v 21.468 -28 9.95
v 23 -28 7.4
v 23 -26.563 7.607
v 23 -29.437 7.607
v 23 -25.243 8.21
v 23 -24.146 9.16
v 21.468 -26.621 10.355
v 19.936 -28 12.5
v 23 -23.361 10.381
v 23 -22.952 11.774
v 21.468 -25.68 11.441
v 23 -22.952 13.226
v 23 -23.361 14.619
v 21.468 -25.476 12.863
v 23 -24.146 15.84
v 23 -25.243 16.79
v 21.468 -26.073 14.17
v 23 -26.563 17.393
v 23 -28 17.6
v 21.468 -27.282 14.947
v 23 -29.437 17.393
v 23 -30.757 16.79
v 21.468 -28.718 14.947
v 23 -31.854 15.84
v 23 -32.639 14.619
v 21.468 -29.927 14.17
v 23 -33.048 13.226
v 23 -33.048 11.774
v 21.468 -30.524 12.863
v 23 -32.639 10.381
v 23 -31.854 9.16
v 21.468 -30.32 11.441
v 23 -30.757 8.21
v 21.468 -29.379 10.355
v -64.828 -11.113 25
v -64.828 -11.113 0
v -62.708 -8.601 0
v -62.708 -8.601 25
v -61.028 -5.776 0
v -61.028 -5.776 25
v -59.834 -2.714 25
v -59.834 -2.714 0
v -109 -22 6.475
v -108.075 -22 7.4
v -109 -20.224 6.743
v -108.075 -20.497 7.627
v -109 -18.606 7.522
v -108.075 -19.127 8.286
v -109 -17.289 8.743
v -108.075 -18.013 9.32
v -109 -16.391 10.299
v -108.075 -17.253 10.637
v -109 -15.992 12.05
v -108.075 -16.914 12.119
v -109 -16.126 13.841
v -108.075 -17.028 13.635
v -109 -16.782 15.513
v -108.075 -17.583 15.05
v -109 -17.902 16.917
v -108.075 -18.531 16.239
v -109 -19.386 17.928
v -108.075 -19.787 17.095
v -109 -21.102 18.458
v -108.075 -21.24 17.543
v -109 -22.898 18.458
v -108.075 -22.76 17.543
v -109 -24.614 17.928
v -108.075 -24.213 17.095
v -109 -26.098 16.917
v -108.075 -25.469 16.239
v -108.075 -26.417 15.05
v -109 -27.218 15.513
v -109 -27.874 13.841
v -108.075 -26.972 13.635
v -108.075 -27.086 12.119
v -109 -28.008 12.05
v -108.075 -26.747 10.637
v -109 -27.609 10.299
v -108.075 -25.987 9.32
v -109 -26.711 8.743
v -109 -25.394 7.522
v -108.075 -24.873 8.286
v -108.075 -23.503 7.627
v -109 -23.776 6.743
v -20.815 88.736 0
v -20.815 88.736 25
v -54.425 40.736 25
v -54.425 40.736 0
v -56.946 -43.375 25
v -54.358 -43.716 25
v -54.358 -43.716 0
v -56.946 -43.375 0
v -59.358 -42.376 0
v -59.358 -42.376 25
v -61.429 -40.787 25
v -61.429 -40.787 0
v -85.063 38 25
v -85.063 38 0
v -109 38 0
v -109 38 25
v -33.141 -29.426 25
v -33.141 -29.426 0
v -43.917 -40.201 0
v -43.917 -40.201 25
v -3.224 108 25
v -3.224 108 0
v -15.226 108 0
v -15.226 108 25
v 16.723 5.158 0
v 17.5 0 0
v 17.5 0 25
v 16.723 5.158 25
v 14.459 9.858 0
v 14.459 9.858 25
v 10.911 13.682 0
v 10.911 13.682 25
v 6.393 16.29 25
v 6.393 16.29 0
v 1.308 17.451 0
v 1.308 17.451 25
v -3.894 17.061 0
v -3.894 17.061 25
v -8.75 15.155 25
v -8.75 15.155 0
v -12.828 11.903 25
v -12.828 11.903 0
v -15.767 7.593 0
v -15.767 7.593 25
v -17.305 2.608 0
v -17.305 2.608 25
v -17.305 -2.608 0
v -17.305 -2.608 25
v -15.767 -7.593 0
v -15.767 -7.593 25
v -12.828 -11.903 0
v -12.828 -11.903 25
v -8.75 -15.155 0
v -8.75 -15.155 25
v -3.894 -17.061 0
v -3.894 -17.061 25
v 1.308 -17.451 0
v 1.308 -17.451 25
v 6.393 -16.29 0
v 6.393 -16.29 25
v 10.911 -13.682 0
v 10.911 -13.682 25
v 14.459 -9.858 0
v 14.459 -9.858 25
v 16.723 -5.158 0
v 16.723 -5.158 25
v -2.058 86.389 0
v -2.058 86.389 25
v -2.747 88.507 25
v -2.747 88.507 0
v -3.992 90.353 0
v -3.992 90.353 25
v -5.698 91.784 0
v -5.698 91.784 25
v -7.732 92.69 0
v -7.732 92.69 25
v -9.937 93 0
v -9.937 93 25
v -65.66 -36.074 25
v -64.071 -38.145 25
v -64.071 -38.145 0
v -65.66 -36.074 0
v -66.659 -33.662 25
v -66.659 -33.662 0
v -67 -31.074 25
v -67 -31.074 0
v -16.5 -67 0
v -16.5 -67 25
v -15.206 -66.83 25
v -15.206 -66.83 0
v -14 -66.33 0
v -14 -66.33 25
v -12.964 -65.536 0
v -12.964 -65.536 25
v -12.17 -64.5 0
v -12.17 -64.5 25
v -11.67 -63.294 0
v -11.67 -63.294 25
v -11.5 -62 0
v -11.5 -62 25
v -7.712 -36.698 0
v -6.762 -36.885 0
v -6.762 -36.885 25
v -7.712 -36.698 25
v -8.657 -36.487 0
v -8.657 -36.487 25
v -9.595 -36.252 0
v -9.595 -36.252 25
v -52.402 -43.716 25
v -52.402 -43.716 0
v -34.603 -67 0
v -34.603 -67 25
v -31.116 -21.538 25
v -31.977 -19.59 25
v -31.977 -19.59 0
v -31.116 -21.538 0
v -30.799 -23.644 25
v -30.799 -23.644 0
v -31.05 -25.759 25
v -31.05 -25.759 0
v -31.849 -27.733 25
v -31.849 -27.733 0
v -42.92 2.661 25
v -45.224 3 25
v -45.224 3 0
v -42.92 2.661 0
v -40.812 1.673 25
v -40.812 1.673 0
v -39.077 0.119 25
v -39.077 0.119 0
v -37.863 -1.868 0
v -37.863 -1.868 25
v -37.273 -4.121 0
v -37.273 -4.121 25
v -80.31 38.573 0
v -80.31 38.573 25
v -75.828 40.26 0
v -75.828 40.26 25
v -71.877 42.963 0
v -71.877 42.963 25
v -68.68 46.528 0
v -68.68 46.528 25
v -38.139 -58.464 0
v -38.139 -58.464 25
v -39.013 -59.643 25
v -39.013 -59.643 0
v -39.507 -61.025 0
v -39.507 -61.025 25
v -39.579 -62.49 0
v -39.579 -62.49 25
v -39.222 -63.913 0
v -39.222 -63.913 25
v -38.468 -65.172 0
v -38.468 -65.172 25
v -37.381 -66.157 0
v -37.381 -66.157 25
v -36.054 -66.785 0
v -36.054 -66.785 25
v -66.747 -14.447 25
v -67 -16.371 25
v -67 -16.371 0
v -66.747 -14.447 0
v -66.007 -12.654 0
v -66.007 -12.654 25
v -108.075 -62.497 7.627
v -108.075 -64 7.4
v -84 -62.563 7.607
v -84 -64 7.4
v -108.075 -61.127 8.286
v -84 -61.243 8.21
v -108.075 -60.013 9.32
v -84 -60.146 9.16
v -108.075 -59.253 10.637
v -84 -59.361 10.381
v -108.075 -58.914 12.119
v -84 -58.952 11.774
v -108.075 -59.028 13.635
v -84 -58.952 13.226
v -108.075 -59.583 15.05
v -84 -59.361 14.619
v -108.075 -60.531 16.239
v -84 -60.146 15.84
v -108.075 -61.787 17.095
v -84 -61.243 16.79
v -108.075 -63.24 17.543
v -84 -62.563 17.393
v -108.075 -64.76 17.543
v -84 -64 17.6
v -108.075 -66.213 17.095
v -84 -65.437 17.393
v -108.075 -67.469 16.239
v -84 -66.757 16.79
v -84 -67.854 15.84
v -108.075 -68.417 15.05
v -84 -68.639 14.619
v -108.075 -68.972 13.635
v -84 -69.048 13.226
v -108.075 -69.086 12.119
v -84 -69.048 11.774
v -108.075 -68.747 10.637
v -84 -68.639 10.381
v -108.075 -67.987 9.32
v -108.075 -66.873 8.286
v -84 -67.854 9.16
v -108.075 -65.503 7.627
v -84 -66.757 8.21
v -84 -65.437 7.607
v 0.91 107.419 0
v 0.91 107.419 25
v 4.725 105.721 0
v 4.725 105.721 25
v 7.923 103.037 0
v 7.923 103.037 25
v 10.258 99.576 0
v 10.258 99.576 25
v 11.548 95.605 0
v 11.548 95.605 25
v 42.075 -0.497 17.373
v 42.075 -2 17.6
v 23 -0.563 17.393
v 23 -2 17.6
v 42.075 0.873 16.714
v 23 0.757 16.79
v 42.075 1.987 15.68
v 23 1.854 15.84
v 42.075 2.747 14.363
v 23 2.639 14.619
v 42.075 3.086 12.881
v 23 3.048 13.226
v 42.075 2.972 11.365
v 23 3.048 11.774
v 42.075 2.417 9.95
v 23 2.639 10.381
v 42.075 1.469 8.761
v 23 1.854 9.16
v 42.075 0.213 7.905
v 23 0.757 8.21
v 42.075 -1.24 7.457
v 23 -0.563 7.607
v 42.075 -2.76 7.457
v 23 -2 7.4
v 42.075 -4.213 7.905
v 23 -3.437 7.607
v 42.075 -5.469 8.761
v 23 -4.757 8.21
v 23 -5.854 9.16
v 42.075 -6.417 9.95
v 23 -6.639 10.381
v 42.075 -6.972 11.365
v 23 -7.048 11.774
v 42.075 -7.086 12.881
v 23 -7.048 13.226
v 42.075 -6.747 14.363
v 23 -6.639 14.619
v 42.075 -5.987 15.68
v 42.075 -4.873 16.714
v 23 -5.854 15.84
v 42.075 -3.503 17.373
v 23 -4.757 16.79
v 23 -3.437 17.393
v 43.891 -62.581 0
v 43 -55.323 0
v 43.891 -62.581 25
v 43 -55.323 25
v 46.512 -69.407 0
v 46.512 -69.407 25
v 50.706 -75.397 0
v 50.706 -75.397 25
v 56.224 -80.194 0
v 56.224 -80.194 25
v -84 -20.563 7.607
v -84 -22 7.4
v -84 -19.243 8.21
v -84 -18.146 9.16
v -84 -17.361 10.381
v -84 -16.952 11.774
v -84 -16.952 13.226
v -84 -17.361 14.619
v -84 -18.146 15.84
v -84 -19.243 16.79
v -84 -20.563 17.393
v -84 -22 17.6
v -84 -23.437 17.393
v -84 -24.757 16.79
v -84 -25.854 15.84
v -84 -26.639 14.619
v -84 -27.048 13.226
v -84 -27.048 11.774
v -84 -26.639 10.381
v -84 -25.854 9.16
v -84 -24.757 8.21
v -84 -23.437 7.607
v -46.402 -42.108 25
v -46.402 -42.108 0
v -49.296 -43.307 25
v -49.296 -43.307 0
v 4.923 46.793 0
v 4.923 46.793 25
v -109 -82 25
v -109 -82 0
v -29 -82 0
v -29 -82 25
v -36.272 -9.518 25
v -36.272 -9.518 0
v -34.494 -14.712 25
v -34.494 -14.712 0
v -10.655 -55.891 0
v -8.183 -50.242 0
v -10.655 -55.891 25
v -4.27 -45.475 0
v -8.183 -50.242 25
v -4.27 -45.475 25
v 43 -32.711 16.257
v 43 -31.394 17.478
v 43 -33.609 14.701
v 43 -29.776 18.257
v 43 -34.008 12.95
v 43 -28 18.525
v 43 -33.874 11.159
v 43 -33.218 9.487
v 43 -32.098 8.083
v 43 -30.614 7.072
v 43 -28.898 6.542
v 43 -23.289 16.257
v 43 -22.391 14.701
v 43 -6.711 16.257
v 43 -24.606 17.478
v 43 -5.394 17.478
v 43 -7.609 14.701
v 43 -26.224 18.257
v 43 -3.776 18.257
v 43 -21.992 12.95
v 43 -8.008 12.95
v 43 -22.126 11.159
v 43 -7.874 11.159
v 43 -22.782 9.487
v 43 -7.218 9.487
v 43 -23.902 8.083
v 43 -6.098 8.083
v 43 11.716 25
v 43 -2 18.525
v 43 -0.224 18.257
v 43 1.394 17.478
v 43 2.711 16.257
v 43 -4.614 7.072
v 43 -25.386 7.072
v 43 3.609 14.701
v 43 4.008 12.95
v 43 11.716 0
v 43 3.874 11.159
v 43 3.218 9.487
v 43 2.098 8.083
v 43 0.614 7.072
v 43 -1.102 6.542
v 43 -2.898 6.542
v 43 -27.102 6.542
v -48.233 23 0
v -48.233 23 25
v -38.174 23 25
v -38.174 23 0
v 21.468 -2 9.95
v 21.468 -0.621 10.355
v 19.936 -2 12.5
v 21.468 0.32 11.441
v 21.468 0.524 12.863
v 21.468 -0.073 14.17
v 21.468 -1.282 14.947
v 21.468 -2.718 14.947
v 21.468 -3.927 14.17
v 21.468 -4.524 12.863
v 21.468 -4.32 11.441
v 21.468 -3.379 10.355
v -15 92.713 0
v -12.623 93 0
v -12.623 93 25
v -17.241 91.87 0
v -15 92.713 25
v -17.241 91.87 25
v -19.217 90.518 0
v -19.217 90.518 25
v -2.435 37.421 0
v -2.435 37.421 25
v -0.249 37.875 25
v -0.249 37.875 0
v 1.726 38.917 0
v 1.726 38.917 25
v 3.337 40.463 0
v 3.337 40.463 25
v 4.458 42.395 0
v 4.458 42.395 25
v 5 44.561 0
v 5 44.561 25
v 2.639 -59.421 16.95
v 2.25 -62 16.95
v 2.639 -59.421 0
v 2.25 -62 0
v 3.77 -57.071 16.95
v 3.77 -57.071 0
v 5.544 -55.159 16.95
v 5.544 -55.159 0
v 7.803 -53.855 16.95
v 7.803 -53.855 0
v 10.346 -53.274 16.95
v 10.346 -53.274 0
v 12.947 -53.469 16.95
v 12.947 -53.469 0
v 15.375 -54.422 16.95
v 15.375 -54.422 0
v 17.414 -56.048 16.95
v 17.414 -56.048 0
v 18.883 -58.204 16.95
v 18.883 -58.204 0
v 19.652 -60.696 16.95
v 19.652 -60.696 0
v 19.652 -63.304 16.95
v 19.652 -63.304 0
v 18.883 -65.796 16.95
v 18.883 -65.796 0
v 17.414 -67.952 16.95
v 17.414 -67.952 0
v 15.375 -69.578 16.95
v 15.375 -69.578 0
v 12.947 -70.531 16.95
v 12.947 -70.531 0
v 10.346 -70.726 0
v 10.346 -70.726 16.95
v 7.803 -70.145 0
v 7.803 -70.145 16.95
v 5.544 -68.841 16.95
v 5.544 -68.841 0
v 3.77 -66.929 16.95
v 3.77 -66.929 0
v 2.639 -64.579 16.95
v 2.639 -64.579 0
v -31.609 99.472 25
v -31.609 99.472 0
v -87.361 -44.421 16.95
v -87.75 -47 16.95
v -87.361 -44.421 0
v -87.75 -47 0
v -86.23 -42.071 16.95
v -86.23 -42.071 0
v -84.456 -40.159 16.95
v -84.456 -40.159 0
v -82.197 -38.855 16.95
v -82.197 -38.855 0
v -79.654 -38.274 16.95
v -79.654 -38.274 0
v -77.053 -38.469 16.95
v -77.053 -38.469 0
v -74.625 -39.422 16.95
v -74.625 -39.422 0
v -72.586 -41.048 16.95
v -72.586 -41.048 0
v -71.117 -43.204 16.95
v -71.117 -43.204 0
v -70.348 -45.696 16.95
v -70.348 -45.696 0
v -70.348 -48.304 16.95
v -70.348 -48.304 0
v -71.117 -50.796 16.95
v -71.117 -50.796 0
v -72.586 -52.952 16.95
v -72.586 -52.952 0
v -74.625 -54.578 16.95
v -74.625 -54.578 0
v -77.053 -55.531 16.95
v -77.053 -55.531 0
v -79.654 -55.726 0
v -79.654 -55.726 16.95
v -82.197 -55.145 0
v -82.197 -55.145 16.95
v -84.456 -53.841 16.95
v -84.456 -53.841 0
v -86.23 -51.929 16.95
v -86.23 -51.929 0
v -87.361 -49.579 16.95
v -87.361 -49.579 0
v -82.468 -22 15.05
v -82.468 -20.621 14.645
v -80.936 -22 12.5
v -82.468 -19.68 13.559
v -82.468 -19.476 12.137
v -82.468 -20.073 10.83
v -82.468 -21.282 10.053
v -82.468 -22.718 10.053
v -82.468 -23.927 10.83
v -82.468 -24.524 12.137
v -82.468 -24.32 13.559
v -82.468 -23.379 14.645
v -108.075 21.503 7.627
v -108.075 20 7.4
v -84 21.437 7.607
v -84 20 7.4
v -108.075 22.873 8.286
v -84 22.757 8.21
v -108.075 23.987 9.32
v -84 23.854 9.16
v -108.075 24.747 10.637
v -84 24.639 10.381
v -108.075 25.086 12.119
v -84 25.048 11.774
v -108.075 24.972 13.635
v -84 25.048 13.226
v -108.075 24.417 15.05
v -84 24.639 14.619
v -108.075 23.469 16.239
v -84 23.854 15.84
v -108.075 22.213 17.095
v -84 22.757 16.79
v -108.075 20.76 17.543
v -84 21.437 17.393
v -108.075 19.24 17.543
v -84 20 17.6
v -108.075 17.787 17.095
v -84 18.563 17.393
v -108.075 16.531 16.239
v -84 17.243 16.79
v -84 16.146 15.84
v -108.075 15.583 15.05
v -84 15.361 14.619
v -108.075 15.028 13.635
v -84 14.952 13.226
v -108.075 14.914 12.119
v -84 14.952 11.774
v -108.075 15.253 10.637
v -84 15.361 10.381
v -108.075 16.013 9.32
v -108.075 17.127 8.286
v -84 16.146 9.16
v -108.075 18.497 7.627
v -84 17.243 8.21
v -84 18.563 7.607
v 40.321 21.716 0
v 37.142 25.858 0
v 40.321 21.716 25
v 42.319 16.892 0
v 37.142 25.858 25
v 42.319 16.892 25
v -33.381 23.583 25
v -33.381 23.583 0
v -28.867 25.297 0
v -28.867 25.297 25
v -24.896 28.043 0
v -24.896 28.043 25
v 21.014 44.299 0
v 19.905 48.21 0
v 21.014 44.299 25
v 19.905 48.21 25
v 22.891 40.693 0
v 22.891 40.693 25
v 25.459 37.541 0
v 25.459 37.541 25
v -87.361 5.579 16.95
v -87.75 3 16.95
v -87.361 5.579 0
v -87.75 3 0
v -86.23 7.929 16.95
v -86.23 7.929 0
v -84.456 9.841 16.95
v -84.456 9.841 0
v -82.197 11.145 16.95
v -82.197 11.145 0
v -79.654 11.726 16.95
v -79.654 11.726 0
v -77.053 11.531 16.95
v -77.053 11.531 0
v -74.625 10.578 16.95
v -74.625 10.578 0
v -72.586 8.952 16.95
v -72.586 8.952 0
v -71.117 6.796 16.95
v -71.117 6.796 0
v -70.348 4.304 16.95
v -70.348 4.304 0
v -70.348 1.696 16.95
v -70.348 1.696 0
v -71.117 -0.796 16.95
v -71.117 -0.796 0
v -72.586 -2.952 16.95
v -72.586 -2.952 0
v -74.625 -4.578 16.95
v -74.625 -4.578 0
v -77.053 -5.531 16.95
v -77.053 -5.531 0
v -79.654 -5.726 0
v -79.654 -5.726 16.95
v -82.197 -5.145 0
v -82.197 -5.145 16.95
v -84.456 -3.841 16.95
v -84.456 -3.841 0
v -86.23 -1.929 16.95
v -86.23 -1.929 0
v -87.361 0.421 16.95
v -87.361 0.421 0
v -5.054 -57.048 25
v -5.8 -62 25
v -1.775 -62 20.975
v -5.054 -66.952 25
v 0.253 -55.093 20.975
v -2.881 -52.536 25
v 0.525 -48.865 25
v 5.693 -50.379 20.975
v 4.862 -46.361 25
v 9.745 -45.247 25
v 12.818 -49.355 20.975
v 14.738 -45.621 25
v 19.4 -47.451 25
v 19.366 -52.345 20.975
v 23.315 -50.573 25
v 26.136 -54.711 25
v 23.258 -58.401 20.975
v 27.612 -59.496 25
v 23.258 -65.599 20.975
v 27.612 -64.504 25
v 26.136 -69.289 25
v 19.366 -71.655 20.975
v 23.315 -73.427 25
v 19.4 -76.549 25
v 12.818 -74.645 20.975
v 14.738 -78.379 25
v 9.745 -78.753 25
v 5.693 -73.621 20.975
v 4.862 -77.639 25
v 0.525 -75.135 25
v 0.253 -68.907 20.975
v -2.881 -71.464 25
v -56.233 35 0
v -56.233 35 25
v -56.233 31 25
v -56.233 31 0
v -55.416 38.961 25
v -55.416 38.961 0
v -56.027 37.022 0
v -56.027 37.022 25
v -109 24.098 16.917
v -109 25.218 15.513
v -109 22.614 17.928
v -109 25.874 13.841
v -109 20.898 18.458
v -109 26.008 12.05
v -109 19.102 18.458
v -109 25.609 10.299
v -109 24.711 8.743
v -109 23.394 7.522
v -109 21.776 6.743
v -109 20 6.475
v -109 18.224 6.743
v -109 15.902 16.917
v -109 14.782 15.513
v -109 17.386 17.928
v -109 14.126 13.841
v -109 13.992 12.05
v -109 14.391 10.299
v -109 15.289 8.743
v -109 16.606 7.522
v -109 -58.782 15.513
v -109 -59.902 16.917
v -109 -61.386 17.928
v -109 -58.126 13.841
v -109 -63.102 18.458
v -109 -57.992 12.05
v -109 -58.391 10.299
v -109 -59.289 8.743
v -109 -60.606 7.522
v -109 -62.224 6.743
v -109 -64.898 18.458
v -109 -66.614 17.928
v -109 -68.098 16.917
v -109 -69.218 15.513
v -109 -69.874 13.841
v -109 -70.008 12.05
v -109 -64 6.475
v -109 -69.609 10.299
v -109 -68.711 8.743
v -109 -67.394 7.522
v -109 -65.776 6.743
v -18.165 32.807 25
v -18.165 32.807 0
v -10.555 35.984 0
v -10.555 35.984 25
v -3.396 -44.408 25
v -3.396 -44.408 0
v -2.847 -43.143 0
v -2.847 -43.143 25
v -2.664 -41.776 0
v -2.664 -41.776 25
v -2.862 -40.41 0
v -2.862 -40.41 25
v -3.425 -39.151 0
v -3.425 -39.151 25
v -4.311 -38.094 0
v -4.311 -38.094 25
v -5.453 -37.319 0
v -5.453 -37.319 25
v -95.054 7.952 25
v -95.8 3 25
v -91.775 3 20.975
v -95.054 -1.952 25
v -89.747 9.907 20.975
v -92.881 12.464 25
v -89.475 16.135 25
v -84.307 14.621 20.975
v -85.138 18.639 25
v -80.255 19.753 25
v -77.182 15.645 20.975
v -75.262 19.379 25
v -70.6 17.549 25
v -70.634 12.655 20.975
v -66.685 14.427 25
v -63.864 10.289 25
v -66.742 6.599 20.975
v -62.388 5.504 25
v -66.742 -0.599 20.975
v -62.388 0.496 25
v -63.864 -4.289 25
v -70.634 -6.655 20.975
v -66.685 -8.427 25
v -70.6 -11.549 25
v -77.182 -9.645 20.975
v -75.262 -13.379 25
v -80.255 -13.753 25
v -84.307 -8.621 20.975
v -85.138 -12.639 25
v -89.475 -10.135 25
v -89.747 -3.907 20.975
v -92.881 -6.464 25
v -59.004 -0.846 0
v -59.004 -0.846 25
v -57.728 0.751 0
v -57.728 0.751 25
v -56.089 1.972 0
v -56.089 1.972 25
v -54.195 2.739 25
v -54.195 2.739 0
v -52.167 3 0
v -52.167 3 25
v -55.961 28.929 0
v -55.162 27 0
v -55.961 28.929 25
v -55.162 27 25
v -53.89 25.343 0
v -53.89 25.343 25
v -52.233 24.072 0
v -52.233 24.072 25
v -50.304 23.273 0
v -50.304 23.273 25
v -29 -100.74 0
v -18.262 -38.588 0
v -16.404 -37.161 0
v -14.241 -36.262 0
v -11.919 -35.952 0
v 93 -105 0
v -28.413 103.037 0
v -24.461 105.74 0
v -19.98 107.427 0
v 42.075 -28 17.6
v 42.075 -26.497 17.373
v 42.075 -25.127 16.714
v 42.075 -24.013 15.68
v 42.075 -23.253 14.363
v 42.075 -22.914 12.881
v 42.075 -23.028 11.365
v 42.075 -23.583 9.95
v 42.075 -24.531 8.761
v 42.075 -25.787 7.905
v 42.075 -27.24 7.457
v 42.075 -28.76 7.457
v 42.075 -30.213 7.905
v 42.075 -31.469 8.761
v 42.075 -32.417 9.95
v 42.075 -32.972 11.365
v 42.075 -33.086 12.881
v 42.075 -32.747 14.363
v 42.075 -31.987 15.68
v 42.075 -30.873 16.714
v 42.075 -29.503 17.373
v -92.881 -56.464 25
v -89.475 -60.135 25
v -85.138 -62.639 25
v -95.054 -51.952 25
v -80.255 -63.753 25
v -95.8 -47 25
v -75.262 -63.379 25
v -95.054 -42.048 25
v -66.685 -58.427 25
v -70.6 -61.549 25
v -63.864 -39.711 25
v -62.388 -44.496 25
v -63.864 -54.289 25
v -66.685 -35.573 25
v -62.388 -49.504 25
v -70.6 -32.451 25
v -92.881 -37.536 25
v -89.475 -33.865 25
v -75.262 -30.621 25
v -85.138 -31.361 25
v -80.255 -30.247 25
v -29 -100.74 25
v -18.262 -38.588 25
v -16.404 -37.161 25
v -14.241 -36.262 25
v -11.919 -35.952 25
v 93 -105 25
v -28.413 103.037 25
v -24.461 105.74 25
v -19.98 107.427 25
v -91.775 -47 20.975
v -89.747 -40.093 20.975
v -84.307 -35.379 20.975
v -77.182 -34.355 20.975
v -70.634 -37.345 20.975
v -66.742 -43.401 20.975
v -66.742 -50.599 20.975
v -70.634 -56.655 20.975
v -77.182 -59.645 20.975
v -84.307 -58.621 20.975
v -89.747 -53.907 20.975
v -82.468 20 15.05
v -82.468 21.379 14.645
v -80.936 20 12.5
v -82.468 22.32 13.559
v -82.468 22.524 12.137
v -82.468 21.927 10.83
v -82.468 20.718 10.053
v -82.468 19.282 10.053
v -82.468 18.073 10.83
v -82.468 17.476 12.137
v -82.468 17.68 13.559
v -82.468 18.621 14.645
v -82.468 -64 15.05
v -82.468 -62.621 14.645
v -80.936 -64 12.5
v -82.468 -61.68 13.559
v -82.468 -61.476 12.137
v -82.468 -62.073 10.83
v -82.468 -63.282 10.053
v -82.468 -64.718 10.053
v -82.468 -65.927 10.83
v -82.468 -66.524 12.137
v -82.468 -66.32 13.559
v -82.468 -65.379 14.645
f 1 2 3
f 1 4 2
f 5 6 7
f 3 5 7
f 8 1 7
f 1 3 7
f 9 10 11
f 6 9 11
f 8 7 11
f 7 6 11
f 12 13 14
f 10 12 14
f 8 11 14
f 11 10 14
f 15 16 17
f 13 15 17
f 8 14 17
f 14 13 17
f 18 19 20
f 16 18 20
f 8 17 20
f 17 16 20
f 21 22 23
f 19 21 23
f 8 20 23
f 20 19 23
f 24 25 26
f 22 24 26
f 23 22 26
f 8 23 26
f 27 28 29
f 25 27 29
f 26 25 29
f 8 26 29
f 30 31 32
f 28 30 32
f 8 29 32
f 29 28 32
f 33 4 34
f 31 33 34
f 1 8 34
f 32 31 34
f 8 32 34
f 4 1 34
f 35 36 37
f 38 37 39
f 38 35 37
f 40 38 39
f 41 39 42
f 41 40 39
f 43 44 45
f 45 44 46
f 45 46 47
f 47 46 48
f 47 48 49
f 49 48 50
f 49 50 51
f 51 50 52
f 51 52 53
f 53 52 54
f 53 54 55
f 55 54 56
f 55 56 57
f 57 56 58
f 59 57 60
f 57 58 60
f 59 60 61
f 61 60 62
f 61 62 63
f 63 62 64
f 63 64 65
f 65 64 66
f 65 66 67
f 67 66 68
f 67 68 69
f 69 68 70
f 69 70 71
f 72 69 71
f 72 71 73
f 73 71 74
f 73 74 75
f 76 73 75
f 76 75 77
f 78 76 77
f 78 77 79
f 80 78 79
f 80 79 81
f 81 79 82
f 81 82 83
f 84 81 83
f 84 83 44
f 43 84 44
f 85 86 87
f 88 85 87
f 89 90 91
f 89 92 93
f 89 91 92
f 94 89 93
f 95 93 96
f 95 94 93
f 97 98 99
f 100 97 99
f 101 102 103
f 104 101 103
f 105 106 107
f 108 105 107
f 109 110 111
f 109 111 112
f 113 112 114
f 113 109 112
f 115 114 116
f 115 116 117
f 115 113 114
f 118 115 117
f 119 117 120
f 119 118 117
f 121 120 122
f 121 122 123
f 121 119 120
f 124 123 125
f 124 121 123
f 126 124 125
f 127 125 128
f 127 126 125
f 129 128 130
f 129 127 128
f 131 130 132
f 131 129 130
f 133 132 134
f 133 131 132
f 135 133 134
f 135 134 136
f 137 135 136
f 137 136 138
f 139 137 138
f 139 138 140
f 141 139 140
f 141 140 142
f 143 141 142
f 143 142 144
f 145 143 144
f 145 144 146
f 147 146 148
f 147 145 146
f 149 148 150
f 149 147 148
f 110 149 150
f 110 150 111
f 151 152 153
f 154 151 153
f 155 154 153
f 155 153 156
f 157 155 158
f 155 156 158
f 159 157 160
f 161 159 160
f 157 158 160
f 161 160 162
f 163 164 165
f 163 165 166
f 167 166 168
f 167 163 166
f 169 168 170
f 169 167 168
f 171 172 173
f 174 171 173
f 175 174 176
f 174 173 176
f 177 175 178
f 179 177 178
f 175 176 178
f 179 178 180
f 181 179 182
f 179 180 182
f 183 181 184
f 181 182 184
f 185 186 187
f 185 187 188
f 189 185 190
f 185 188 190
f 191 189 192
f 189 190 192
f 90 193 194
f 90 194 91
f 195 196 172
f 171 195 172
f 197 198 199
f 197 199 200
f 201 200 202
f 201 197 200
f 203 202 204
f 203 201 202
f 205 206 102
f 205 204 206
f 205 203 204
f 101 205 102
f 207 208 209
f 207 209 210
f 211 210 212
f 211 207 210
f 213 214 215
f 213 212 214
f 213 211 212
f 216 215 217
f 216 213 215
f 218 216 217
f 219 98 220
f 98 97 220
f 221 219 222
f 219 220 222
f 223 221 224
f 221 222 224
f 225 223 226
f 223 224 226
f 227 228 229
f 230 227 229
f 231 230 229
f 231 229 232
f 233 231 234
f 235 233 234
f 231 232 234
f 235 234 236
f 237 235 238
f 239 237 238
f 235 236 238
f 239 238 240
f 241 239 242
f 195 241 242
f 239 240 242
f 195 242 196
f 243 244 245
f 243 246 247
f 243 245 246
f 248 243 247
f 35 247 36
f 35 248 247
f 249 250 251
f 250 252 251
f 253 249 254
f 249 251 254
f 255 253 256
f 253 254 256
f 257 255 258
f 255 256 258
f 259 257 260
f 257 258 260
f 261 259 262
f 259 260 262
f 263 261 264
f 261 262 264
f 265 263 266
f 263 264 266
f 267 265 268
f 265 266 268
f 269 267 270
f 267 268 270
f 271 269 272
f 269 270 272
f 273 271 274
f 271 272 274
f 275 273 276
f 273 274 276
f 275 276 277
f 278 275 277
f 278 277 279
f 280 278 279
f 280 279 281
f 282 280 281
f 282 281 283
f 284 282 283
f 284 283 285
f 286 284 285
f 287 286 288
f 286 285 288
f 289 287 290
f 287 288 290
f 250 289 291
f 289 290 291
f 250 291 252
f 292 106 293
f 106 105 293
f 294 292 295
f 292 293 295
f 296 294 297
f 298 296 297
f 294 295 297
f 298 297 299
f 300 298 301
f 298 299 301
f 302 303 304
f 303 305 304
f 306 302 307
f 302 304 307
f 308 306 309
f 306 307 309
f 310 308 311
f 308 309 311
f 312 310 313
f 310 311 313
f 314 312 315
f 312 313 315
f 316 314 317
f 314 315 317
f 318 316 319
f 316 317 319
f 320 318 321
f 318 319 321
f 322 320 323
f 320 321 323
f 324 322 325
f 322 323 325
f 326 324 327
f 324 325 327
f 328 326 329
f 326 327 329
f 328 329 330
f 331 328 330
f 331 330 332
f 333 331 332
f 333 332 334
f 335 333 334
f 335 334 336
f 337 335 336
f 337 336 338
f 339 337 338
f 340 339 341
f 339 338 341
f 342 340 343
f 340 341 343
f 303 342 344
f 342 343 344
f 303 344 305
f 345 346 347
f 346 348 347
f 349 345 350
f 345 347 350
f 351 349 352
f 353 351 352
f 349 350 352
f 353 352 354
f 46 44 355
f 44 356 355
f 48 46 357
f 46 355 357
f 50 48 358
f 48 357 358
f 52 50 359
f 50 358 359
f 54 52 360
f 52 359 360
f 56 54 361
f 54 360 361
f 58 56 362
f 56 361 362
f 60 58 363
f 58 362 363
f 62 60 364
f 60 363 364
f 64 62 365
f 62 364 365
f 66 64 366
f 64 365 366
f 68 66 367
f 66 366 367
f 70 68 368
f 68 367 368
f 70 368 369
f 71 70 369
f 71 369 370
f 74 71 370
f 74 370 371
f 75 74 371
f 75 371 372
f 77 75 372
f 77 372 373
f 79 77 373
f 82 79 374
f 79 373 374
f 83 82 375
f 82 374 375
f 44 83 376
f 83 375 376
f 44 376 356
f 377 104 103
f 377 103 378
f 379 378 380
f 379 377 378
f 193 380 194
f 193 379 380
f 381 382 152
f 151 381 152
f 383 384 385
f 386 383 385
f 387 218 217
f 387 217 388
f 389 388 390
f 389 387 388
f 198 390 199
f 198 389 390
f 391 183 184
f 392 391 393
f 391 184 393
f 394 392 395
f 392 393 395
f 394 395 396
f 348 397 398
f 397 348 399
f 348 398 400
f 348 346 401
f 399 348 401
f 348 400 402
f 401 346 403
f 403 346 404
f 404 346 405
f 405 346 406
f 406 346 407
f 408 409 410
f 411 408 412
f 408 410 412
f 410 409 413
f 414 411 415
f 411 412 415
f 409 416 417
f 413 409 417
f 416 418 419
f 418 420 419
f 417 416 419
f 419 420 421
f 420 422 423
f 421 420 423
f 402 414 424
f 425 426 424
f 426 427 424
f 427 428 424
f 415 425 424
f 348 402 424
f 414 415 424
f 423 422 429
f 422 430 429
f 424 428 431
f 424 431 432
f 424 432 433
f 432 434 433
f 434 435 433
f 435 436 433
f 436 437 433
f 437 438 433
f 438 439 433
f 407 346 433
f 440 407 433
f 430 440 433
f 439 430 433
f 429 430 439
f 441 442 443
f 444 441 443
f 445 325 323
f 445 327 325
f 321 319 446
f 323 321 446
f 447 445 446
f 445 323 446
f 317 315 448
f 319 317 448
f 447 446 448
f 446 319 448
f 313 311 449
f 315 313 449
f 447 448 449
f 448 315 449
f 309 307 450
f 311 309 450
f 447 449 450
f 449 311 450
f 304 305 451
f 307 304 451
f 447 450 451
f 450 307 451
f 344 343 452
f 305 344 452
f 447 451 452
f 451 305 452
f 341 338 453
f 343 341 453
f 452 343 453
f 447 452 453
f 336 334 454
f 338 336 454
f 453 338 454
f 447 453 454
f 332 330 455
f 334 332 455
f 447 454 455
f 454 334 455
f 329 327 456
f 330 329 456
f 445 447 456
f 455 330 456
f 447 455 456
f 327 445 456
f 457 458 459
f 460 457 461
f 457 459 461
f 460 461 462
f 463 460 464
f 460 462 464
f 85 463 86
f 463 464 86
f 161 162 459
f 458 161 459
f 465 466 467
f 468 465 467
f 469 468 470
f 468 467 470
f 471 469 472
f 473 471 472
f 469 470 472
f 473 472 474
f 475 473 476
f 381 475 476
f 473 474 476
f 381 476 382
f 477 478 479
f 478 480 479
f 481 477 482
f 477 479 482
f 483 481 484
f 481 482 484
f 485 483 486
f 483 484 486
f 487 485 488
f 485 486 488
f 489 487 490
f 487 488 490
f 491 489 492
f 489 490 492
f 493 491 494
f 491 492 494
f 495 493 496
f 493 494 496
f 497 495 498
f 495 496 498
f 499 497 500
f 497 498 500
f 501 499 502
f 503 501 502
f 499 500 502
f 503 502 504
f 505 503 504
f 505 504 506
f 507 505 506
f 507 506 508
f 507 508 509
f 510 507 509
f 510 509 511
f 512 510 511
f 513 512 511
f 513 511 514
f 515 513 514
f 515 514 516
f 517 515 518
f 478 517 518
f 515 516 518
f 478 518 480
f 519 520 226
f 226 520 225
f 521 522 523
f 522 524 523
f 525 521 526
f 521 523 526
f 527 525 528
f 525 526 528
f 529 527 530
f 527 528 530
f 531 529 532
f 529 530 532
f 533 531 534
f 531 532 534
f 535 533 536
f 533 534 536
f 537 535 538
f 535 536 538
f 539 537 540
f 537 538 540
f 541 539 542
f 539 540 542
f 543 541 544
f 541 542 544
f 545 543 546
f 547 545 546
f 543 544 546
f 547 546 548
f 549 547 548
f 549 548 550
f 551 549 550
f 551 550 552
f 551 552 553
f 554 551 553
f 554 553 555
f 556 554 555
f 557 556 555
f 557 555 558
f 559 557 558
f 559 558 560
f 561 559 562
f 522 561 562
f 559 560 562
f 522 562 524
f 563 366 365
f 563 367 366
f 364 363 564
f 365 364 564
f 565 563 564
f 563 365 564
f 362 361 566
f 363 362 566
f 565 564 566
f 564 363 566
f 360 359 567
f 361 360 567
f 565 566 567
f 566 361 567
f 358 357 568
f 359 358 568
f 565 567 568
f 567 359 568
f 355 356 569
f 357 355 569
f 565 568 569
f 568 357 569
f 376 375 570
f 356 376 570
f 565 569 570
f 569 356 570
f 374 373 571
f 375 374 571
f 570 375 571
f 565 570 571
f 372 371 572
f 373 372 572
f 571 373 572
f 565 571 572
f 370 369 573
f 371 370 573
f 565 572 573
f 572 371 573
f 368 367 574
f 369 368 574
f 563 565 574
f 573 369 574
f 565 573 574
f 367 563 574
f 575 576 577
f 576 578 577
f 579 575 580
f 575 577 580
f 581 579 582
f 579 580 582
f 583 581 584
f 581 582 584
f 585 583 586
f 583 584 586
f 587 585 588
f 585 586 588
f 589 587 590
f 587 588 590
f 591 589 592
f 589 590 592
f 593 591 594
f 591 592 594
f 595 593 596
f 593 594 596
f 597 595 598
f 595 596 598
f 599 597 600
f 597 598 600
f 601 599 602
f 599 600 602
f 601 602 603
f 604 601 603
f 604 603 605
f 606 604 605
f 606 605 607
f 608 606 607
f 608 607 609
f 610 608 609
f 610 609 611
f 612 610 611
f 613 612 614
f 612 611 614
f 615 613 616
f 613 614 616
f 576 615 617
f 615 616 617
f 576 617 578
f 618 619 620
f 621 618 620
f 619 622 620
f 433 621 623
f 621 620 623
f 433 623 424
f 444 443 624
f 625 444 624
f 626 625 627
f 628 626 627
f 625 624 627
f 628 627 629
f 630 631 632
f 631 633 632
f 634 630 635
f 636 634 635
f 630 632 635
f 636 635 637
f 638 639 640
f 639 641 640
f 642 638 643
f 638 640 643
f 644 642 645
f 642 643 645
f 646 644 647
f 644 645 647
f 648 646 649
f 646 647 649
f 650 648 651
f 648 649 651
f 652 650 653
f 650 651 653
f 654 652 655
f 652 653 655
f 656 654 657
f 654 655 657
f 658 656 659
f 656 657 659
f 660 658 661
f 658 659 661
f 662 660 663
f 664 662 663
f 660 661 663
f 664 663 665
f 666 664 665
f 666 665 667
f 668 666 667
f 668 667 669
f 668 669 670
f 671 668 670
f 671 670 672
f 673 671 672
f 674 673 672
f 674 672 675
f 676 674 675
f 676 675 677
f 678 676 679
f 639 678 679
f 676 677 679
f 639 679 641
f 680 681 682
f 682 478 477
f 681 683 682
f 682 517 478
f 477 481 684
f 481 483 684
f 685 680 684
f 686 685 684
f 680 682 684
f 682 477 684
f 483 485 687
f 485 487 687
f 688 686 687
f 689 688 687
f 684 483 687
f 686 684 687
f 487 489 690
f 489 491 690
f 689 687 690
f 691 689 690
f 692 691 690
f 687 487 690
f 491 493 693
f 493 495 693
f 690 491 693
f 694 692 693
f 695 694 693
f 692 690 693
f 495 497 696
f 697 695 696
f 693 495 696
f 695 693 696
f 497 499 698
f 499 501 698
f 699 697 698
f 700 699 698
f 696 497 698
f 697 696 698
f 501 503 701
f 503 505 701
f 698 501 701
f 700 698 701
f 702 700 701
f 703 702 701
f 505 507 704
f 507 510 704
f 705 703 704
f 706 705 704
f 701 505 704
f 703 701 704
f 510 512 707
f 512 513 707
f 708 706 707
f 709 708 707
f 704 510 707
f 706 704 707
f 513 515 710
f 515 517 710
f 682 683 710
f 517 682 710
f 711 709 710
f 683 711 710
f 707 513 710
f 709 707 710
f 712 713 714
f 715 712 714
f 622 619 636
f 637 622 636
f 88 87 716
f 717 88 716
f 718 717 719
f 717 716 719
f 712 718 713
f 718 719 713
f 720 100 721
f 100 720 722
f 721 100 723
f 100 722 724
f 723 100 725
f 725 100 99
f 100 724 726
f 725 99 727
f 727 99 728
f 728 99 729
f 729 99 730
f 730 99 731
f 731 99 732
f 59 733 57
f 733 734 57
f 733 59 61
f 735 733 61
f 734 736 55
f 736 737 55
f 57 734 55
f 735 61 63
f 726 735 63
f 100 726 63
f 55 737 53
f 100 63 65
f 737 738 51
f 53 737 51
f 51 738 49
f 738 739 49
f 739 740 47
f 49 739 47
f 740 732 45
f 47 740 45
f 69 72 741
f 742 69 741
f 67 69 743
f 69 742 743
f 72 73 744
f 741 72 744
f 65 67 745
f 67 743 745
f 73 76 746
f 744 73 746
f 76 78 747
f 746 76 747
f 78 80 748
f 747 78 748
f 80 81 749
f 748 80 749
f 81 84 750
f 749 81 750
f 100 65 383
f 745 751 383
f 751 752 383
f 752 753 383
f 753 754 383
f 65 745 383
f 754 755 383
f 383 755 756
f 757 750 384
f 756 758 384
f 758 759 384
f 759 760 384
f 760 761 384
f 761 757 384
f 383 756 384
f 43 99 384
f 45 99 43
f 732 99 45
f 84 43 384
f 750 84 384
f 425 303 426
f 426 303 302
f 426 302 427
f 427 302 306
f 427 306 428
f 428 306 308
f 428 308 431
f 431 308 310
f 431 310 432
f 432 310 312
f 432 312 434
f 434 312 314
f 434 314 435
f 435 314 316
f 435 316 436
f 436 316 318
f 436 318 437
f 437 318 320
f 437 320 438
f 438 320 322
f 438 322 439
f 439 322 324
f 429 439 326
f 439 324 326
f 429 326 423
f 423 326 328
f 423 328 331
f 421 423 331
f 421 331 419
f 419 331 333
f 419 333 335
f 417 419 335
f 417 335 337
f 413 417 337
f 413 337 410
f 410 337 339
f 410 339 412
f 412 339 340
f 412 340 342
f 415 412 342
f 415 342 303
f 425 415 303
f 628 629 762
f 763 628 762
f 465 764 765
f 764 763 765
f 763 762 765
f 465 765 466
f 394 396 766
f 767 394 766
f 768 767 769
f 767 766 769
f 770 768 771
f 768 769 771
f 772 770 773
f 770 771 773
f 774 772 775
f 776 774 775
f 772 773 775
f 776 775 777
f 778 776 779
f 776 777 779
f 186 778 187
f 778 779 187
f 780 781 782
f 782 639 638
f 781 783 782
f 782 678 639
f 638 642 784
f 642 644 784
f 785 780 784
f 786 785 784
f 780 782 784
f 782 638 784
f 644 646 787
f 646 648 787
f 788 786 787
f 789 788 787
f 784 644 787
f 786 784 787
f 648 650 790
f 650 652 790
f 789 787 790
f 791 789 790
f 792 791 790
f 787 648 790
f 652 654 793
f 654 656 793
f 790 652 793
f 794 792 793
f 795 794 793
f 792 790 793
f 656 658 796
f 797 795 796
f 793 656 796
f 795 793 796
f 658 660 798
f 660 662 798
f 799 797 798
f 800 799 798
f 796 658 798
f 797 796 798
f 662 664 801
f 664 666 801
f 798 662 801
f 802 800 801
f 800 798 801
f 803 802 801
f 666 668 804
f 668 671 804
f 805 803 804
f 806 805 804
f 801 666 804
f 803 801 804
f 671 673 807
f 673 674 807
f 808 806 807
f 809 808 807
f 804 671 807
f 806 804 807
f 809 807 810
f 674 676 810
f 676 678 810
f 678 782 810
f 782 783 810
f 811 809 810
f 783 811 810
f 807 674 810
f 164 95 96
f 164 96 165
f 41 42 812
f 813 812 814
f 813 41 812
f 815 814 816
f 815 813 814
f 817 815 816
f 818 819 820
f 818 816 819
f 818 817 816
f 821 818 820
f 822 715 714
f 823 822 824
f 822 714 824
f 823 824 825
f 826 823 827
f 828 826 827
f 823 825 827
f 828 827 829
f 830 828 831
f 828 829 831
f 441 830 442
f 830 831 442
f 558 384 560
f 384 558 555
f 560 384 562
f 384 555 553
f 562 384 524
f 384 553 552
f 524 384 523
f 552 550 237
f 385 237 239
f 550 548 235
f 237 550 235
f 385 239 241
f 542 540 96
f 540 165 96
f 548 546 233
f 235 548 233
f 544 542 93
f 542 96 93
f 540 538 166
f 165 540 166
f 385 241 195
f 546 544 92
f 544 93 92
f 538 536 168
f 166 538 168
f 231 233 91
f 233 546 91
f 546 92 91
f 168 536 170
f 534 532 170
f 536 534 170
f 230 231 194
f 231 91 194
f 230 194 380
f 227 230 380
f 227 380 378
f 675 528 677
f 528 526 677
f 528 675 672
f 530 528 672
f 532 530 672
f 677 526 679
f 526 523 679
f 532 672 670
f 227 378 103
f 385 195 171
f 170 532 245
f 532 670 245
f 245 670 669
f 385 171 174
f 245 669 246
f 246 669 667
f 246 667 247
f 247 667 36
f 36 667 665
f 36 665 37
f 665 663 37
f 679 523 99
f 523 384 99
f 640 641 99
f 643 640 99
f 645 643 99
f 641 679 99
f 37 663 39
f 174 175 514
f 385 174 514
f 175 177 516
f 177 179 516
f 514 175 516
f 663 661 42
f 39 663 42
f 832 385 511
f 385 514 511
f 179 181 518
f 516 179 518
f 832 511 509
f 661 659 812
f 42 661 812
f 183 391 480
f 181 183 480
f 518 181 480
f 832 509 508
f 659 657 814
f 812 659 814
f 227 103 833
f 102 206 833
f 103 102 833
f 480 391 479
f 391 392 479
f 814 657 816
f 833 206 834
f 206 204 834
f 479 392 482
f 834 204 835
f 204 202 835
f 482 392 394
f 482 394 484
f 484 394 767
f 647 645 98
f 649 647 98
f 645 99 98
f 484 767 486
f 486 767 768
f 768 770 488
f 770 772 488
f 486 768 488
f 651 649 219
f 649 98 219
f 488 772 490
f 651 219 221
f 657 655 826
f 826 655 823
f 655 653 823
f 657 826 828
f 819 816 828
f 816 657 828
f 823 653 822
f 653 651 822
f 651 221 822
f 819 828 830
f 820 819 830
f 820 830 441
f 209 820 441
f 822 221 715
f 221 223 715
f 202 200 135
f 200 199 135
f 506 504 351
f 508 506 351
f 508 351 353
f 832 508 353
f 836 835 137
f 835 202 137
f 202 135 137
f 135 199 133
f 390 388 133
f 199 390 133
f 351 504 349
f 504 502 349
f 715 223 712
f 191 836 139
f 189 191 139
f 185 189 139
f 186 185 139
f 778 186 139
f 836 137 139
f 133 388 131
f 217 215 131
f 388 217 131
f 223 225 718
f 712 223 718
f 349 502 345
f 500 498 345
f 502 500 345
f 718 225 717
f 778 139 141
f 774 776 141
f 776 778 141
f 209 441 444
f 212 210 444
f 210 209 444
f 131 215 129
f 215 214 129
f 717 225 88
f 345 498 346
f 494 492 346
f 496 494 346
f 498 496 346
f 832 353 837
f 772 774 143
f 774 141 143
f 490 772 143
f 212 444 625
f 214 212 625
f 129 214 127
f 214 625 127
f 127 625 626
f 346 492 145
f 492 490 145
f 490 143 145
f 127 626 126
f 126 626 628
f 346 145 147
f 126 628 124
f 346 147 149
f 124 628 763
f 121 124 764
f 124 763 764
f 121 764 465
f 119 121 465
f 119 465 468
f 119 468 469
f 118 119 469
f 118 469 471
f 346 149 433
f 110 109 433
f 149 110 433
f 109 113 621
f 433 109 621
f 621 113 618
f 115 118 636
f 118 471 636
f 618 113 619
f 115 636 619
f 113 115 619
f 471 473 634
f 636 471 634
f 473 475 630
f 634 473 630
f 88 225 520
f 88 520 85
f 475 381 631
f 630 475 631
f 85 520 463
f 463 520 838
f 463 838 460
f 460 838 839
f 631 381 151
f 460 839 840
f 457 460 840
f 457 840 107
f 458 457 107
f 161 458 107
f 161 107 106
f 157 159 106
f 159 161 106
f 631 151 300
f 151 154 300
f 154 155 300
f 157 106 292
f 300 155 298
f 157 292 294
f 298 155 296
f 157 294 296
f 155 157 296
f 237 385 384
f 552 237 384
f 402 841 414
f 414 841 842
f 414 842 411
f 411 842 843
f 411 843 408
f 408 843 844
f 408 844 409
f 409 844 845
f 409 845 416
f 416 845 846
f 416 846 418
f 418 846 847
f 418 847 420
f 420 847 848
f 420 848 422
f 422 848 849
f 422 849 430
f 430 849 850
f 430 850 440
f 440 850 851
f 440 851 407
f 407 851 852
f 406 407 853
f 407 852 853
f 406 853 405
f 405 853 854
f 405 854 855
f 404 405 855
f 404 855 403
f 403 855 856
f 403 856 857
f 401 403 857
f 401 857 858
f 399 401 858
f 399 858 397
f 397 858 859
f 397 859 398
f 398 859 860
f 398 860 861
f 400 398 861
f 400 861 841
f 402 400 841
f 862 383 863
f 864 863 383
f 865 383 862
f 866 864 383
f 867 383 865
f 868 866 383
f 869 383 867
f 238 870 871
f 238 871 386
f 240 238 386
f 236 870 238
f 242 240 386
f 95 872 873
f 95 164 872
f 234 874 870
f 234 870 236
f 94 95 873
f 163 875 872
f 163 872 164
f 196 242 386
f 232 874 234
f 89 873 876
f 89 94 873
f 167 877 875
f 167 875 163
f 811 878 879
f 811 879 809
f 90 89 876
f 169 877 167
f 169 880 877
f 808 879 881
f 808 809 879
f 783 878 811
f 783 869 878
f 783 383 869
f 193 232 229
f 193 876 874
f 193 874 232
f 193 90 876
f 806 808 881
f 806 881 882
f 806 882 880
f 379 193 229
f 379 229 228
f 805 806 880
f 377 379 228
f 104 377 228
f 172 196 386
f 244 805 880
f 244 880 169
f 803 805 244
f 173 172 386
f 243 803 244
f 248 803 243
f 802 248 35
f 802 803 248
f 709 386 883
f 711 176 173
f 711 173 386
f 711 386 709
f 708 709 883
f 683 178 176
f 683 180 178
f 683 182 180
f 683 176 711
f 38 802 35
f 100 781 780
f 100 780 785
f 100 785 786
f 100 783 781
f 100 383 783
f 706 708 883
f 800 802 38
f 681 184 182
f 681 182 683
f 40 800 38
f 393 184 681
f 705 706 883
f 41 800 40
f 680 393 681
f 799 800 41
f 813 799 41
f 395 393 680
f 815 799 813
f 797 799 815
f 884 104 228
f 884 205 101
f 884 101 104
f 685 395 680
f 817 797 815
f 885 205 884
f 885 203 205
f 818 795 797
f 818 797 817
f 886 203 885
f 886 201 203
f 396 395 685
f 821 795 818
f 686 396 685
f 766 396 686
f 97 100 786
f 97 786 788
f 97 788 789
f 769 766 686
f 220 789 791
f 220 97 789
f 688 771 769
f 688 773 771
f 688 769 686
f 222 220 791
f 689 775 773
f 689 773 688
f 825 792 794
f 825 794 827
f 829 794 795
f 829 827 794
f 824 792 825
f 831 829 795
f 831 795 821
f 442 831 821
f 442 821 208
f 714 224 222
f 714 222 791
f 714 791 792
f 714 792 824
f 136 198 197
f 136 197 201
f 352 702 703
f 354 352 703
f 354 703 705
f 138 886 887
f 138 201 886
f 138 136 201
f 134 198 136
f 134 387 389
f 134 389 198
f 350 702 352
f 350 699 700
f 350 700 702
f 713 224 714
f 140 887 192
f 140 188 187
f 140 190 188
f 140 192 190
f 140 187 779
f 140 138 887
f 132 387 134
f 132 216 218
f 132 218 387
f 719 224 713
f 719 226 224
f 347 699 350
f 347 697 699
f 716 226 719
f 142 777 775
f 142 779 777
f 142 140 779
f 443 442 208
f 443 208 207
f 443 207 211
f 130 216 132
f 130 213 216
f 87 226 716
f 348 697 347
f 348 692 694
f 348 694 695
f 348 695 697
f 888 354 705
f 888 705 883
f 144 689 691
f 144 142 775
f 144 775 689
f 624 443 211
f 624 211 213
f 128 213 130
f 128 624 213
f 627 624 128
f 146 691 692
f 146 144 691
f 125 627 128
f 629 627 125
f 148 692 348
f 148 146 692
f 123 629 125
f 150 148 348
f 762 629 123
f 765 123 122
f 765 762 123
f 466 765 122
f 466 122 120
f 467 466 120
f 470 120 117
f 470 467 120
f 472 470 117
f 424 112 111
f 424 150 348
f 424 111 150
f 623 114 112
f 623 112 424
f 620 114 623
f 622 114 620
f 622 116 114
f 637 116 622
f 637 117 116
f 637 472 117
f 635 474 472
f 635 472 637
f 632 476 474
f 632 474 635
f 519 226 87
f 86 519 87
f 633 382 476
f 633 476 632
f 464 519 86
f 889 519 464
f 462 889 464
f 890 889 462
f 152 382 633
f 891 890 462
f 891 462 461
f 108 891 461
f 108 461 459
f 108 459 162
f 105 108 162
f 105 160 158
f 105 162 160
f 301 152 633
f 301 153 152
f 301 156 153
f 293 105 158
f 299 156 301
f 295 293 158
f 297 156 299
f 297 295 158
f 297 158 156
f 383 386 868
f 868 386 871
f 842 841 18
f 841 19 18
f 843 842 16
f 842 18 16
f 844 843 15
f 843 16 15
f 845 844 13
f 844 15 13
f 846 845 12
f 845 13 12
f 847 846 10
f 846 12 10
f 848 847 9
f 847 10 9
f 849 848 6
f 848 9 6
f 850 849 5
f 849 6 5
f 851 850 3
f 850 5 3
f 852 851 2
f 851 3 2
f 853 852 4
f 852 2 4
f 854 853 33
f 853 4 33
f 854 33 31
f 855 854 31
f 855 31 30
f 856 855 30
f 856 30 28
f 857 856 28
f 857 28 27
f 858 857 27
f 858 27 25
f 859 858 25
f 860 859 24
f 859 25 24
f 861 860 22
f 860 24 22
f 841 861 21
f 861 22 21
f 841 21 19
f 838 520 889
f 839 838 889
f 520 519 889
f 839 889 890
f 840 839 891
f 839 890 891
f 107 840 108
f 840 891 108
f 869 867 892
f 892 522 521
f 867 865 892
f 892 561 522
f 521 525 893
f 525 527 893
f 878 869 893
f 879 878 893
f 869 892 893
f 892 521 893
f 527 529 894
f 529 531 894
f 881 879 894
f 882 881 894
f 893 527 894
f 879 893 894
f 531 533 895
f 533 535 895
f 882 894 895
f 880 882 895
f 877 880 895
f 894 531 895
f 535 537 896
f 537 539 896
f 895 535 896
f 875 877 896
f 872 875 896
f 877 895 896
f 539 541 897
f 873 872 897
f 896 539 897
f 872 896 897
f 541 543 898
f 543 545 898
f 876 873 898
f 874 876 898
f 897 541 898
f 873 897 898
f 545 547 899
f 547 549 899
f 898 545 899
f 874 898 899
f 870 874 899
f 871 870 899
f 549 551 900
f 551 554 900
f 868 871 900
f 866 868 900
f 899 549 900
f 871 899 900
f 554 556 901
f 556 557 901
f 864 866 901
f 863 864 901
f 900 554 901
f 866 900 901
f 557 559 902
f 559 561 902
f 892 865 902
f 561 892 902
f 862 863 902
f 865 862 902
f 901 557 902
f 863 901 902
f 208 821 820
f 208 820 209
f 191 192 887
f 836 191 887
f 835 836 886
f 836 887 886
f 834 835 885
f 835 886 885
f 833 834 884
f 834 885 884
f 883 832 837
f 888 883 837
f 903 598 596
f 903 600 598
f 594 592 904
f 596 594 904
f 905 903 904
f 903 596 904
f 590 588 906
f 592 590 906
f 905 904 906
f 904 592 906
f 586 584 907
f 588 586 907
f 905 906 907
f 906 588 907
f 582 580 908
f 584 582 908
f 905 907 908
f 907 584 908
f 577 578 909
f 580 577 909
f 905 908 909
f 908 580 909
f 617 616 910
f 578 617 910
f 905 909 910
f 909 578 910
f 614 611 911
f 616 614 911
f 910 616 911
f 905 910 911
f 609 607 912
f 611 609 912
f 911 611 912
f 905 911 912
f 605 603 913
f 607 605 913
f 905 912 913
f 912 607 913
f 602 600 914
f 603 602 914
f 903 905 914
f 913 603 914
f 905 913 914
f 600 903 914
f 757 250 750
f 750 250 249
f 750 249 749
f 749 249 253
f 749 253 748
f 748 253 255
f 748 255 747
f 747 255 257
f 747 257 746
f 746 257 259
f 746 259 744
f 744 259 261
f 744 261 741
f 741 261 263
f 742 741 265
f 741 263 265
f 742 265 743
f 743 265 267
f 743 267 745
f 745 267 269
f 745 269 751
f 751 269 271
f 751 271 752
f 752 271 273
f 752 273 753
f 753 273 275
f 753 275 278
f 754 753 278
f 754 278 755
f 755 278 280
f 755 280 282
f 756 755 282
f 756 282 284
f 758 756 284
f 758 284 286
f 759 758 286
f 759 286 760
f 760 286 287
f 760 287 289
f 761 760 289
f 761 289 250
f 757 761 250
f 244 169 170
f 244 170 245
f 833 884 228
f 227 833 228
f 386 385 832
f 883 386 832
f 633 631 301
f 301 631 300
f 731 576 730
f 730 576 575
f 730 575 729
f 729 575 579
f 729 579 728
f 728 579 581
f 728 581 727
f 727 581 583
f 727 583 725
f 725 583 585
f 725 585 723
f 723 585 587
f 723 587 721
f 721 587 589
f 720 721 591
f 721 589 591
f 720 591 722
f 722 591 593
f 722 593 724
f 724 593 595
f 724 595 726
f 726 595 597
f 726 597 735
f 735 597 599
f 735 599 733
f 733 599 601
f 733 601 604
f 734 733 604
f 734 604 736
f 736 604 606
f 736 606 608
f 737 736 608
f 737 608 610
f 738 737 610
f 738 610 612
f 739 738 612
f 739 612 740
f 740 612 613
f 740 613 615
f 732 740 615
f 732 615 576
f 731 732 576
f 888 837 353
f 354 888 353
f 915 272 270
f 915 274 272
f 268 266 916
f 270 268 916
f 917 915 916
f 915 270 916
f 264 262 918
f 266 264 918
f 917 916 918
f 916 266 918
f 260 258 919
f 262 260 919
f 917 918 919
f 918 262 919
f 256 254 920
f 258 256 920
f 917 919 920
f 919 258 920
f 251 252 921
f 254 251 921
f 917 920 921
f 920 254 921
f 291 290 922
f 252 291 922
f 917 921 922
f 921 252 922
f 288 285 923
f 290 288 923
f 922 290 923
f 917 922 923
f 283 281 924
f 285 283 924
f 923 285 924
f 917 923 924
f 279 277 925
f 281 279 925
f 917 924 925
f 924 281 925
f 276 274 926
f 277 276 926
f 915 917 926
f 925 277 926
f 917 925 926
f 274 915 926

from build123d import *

# Parameters (mm, degrees)
ESBO_O1_R                                           = 17.5
RESSALTO_EXTRUS_O1_DEPTH                            = 25
FILETE1_R                                           = 20
FILETE3_R                                           = 15
CORTE_EXTRUS_O1_DEPTH                               = 156.467038307
ESCAREADO_PARA_PARAFUSO_ALLEN_SEXTAVADO_D           = 17.5
ESCAREADO_PARA_PARAFUSO_ALLEN_SEXTAVADO_CSINK_D     = 33.6
ESCAREADO_PARA_PARAFUSO_ALLEN_SEXTAVADO_CSINK_ANGLE = 90
FURO_ROSCADO_DE_M121_D                              = 10.2
FURO_ROSCADO_DE_M121_DEPTH                          = 25
FURO_ROSCADO_DE_M121_CSINK_D                        = 12.05
FURO_ROSCADO_DE_M121_CSINK_ANGLE                    = 90
FURO_ROSCADO_DE_M121_TIP                            = 3.064389157
FURO_ROSCADO_DE_M122_D                              = 10.2
FURO_ROSCADO_DE_M122_DEPTH                          = 20
FURO_ROSCADO_DE_M122_CSINK_D                        = 12.05
FURO_ROSCADO_DE_M122_CSINK_ANGLE                    = 90
FURO_ROSCADO_DE_M122_TIP                            = 3.064389157
FILETE12_R                                          = 30


with BuildPart() as part:
    # Esboço1 → Ressalto-extrusão1 (new body)
    with BuildSketch(Plane.XY):
        Polygon((-109, 38), (-109, -82), (-29, -82), (-29, -100.739666122), (93, -105), (43, -71.274574158), (43, 20), (21, 42), (9.362419273, 108), (-25.637580727, 108), (-74.652108401, 38), align=None)
        Circle(ESBO_O1_R, mode=Mode.SUBTRACT)
    extrude(amount=RESSALTO_EXTRUS_O1_DEPTH)

    # Filete1
    filete1_edges = [part.edges().sort_by_distance(p)[0] for p in [
        (21, 42, 12.5),
        (43, 20, 12.5),
        (-74.652108401, 38, 12.5),
        (-25.637580727, 108, 12.5),
    ]]
    fillet(filete1_edges, radius=FILETE1_R)

    # Filete3
    filete3_edges = [part.edges().sort_by_distance(p)[0] for p in [
        (9.362419273, 108, 12.5),
    ]]
    fillet(filete3_edges, radius=FILETE3_R)

    # Esboço2 → Corte-extrusão1 (cut, through all)
    with BuildSketch(Plane.XY.offset(25)):
        with BuildLine():
            Line((-20.814924906, 88.735764364), (-54.42488674, 40.735764364))
            ThreePointArc((-54.42488674, 40.735764364), (-55.770535805, 38.007057995), (-56.233366297, 35))
            Line((-56.233366297, 35), (-56.233366297, 31))
            ThreePointArc((-56.233366297, 31), (-53.890220547, 25.343145751), (-48.233366297, 23))
            Line((-48.233366297, 23), (-38.173943993, 23))
            ThreePointArc((-38.173943993, 23), (-31.072198954, 24.303336731), (-24.89605043, 28.043478261))
            ThreePointArc((-24.89605043, 28.043478261), (-14.44771543, 34.605108277), (-2.435454992, 37.420830549))
            ThreePointArc((-2.435454992, 37.420830549), (3.337174211, 40.463464565), (4.9234433, 46.793126488))
            Line((4.9234433, 46.793126488), (-2.05841022, 86.389185421))
            ThreePointArc((-2.05841022, 86.389185421), (-4.794571366, 91.128355545), (-9.936872244, 93))
            Line((-9.936872244, 93), (-12.623404463, 93))
            ThreePointArc((-12.623404463, 93), (-17.240890595, 91.870108332), (-20.814924906, 88.735764364))
        make_face()
        with BuildLine():
            Line((-52.16718427, 3), (-45.224440295, 3))
            ThreePointArc((-45.224440295, 3), (-39.887445215, 0.959570749), (-37.272890353, -4.120879121))
            ThreePointArc((-37.272890353, -4.120879121), (-35.47802498, -12.147417153), (-31.976509443, -19.589610609))
            ThreePointArc((-31.976509443, -19.589610609), (-30.853677224, -24.709534266), (-33.141310542, -29.425581789))
            Line((-33.141310542, -29.425581789), (-43.916738879, -40.201010127))
            ThreePointArc((-43.916738879, -40.201010127), (-47.809819065, -42.802283143), (-52.402020254, -43.715728753))
            Line((-52.402020254, -43.715728753), (-54.357864376, -43.715728753))
            ThreePointArc((-54.357864376, -43.715728753), (-58.1846987, -42.954524078), (-61.428932188, -40.786796564))
            Line((-61.428932188, -40.786796564), (-64.071067812, -38.144660941))
            ThreePointArc((-64.071067812, -38.144660941), (-66.238795325, -34.900427452), (-67, -31.073593129))
            Line((-67, -31.073593129), (-67, -16.370637166))
            ThreePointArc((-67, -16.370637166), (-66.435760282, -13.526287035), (-64.828493161, -11.112703282))
            ThreePointArc((-64.828493161, -11.112703282), (-61.810304111, -7.223226263), (-59.83370305, -2.714285714))
            ThreePointArc((-59.83370305, -2.714285714), (-56.948098707, 1.414269806), (-52.16718427, 3))
        make_face()
        with BuildLine():
            Line((-18.262146843, -38.588048651), (-38.138564286, -58.464466094))
            ThreePointArc((-38.138564286, -58.464466094), (-39.222428043, -63.913417162), (-34.60303038, -67))
            Line((-34.60303038, -67), (-16.5, -67))
            ThreePointArc((-16.5, -67), (-12.964466094, -65.535533906), (-11.5, -62))
            ThreePointArc((-11.5, -62), (-9.613540035, -52.981576235), (-4.270491803, -45.475409836))
            ThreePointArc((-4.270491803, -45.475409836), (-2.861886802, -40.410318309), (-6.762295082, -36.885245902))
            ThreePointArc((-6.762295082, -36.885245902), (-8.184936807, -36.595857818), (-9.595311139, -36.251620711))
            ThreePointArc((-9.595311139, -36.251620711), (-14.240797491, -36.262235776), (-18.262146843, -38.588048651))
        make_face()
    extrude(amount=-CORTE_EXTRUS_O1_DEPTH, mode=Mode.SUBTRACT)

    # Escareado para parafuso Allen sextavado (through all)
    with Locations(Plane(origin=(-79, 3, 25), x_dir=(1, 0, 0), z_dir=(0, 0, 1))):
        with Locations((0, 0), (0, -50), (90, -65)):
            CounterSinkHole(ESCAREADO_PARA_PARAFUSO_ALLEN_SEXTAVADO_D / 2, ESCAREADO_PARA_PARAFUSO_ALLEN_SEXTAVADO_CSINK_D / 2, counter_sink_angle=ESCAREADO_PARA_PARAFUSO_ALLEN_SEXTAVADO_CSINK_ANGLE)

    # Furo roscado de M121
    with Locations(Plane.ZY.offset(109)):
        with Locations((12.5, 20), (12.5, -22), (12.5, -64)):
            CounterSinkHole(FURO_ROSCADO_DE_M121_D / 2, FURO_ROSCADO_DE_M121_CSINK_D / 2, depth=FURO_ROSCADO_DE_M121_DEPTH, counter_sink_angle=FURO_ROSCADO_DE_M121_CSINK_ANGLE)
            with Locations((0, 0, -(FURO_ROSCADO_DE_M121_DEPTH + FURO_ROSCADO_DE_M121_TIP / 2))):  # 118° drill point
                Cone(0, FURO_ROSCADO_DE_M121_D / 2, FURO_ROSCADO_DE_M121_TIP, mode=Mode.SUBTRACT)

    # Furo roscado de M122
    with Locations(Plane(origin=(43, 0, 0), x_dir=(0, 0, -1), z_dir=(1, 0, 0))):
        with Locations((-12.5, -2), (-12.5, -28)):
            CounterSinkHole(FURO_ROSCADO_DE_M122_D / 2, FURO_ROSCADO_DE_M122_CSINK_D / 2, depth=FURO_ROSCADO_DE_M122_DEPTH, counter_sink_angle=FURO_ROSCADO_DE_M122_CSINK_ANGLE)
            with Locations((0, 0, -(FURO_ROSCADO_DE_M122_DEPTH + FURO_ROSCADO_DE_M122_TIP / 2))):  # 118° drill point
                Cone(0, FURO_ROSCADO_DE_M122_D / 2, FURO_ROSCADO_DE_M122_TIP, mode=Mode.SUBTRACT)

    # Filete12
    filete12_edges = [part.edges().sort_by_distance(p)[0] for p in [
        (43, -71.274574158, 12.5),
    ]]
    fillet(filete12_edges, radius=FILETE12_R)


solid = part.part
